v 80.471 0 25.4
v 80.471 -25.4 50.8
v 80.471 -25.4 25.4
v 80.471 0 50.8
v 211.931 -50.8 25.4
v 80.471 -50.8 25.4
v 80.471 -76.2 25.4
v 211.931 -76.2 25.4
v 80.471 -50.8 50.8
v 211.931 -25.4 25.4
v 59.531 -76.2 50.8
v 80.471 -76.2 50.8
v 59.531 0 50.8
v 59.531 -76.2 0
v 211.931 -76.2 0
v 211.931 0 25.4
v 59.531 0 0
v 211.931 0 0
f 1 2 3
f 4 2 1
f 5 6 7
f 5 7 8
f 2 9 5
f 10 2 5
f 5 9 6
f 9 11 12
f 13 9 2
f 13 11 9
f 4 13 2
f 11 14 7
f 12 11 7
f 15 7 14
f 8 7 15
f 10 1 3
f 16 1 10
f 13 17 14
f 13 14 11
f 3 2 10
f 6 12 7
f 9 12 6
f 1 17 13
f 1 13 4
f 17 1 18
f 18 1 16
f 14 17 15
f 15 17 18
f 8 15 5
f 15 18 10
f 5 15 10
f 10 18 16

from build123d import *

# Parameters (mm, degrees)
F0_W     = 152.4
F0_H     = 50.8
F1_DEPTH = 76.2
F2_W     = 131.459884
F2_H     = 25.4
F3_DEPTH = 25.4
F4_W     = 131.459884
F4_H     = 25.4
F5_DEPTH = 25.4
F7_DEPTH = 25.4


with BuildPart() as f1:
    # F0 (on Front) → F1 (new body)
    with BuildSketch(Plane.XZ):
        with Locations((135.731251, 25.4)):
            Rectangle(F0_W, F0_H)
    extrude(amount=F1_DEPTH)

    # F2 (on face) → F3 (cut)
    with BuildSketch(Plane.XY.offset(50.8)):
        with Locations((146.201309, -63.5)):
            Rectangle(F2_W, F2_H)
    extrude(amount=-F3_DEPTH, mode=Mode.SUBTRACT)

    # F4 (on face) → F5 (cut)
    with BuildSketch(Plane.XY.offset(50.8)):
        with Locations((146.201309, -12.7)):
            Rectangle(F4_W, F4_H)
    extrude(amount=-F5_DEPTH, mode=Mode.SUBTRACT)

    # F6 (on face) → F7 (cut)
    with BuildSketch(Plane.XZ.offset(50.8)):
        Polygon((211.931251, 50.8), (80.471367, 50.8), (211.931251, 25.4), align=None)
    extrude(amount=-F7_DEPTH, mode=Mode.SUBTRACT)


solid = f1.part
